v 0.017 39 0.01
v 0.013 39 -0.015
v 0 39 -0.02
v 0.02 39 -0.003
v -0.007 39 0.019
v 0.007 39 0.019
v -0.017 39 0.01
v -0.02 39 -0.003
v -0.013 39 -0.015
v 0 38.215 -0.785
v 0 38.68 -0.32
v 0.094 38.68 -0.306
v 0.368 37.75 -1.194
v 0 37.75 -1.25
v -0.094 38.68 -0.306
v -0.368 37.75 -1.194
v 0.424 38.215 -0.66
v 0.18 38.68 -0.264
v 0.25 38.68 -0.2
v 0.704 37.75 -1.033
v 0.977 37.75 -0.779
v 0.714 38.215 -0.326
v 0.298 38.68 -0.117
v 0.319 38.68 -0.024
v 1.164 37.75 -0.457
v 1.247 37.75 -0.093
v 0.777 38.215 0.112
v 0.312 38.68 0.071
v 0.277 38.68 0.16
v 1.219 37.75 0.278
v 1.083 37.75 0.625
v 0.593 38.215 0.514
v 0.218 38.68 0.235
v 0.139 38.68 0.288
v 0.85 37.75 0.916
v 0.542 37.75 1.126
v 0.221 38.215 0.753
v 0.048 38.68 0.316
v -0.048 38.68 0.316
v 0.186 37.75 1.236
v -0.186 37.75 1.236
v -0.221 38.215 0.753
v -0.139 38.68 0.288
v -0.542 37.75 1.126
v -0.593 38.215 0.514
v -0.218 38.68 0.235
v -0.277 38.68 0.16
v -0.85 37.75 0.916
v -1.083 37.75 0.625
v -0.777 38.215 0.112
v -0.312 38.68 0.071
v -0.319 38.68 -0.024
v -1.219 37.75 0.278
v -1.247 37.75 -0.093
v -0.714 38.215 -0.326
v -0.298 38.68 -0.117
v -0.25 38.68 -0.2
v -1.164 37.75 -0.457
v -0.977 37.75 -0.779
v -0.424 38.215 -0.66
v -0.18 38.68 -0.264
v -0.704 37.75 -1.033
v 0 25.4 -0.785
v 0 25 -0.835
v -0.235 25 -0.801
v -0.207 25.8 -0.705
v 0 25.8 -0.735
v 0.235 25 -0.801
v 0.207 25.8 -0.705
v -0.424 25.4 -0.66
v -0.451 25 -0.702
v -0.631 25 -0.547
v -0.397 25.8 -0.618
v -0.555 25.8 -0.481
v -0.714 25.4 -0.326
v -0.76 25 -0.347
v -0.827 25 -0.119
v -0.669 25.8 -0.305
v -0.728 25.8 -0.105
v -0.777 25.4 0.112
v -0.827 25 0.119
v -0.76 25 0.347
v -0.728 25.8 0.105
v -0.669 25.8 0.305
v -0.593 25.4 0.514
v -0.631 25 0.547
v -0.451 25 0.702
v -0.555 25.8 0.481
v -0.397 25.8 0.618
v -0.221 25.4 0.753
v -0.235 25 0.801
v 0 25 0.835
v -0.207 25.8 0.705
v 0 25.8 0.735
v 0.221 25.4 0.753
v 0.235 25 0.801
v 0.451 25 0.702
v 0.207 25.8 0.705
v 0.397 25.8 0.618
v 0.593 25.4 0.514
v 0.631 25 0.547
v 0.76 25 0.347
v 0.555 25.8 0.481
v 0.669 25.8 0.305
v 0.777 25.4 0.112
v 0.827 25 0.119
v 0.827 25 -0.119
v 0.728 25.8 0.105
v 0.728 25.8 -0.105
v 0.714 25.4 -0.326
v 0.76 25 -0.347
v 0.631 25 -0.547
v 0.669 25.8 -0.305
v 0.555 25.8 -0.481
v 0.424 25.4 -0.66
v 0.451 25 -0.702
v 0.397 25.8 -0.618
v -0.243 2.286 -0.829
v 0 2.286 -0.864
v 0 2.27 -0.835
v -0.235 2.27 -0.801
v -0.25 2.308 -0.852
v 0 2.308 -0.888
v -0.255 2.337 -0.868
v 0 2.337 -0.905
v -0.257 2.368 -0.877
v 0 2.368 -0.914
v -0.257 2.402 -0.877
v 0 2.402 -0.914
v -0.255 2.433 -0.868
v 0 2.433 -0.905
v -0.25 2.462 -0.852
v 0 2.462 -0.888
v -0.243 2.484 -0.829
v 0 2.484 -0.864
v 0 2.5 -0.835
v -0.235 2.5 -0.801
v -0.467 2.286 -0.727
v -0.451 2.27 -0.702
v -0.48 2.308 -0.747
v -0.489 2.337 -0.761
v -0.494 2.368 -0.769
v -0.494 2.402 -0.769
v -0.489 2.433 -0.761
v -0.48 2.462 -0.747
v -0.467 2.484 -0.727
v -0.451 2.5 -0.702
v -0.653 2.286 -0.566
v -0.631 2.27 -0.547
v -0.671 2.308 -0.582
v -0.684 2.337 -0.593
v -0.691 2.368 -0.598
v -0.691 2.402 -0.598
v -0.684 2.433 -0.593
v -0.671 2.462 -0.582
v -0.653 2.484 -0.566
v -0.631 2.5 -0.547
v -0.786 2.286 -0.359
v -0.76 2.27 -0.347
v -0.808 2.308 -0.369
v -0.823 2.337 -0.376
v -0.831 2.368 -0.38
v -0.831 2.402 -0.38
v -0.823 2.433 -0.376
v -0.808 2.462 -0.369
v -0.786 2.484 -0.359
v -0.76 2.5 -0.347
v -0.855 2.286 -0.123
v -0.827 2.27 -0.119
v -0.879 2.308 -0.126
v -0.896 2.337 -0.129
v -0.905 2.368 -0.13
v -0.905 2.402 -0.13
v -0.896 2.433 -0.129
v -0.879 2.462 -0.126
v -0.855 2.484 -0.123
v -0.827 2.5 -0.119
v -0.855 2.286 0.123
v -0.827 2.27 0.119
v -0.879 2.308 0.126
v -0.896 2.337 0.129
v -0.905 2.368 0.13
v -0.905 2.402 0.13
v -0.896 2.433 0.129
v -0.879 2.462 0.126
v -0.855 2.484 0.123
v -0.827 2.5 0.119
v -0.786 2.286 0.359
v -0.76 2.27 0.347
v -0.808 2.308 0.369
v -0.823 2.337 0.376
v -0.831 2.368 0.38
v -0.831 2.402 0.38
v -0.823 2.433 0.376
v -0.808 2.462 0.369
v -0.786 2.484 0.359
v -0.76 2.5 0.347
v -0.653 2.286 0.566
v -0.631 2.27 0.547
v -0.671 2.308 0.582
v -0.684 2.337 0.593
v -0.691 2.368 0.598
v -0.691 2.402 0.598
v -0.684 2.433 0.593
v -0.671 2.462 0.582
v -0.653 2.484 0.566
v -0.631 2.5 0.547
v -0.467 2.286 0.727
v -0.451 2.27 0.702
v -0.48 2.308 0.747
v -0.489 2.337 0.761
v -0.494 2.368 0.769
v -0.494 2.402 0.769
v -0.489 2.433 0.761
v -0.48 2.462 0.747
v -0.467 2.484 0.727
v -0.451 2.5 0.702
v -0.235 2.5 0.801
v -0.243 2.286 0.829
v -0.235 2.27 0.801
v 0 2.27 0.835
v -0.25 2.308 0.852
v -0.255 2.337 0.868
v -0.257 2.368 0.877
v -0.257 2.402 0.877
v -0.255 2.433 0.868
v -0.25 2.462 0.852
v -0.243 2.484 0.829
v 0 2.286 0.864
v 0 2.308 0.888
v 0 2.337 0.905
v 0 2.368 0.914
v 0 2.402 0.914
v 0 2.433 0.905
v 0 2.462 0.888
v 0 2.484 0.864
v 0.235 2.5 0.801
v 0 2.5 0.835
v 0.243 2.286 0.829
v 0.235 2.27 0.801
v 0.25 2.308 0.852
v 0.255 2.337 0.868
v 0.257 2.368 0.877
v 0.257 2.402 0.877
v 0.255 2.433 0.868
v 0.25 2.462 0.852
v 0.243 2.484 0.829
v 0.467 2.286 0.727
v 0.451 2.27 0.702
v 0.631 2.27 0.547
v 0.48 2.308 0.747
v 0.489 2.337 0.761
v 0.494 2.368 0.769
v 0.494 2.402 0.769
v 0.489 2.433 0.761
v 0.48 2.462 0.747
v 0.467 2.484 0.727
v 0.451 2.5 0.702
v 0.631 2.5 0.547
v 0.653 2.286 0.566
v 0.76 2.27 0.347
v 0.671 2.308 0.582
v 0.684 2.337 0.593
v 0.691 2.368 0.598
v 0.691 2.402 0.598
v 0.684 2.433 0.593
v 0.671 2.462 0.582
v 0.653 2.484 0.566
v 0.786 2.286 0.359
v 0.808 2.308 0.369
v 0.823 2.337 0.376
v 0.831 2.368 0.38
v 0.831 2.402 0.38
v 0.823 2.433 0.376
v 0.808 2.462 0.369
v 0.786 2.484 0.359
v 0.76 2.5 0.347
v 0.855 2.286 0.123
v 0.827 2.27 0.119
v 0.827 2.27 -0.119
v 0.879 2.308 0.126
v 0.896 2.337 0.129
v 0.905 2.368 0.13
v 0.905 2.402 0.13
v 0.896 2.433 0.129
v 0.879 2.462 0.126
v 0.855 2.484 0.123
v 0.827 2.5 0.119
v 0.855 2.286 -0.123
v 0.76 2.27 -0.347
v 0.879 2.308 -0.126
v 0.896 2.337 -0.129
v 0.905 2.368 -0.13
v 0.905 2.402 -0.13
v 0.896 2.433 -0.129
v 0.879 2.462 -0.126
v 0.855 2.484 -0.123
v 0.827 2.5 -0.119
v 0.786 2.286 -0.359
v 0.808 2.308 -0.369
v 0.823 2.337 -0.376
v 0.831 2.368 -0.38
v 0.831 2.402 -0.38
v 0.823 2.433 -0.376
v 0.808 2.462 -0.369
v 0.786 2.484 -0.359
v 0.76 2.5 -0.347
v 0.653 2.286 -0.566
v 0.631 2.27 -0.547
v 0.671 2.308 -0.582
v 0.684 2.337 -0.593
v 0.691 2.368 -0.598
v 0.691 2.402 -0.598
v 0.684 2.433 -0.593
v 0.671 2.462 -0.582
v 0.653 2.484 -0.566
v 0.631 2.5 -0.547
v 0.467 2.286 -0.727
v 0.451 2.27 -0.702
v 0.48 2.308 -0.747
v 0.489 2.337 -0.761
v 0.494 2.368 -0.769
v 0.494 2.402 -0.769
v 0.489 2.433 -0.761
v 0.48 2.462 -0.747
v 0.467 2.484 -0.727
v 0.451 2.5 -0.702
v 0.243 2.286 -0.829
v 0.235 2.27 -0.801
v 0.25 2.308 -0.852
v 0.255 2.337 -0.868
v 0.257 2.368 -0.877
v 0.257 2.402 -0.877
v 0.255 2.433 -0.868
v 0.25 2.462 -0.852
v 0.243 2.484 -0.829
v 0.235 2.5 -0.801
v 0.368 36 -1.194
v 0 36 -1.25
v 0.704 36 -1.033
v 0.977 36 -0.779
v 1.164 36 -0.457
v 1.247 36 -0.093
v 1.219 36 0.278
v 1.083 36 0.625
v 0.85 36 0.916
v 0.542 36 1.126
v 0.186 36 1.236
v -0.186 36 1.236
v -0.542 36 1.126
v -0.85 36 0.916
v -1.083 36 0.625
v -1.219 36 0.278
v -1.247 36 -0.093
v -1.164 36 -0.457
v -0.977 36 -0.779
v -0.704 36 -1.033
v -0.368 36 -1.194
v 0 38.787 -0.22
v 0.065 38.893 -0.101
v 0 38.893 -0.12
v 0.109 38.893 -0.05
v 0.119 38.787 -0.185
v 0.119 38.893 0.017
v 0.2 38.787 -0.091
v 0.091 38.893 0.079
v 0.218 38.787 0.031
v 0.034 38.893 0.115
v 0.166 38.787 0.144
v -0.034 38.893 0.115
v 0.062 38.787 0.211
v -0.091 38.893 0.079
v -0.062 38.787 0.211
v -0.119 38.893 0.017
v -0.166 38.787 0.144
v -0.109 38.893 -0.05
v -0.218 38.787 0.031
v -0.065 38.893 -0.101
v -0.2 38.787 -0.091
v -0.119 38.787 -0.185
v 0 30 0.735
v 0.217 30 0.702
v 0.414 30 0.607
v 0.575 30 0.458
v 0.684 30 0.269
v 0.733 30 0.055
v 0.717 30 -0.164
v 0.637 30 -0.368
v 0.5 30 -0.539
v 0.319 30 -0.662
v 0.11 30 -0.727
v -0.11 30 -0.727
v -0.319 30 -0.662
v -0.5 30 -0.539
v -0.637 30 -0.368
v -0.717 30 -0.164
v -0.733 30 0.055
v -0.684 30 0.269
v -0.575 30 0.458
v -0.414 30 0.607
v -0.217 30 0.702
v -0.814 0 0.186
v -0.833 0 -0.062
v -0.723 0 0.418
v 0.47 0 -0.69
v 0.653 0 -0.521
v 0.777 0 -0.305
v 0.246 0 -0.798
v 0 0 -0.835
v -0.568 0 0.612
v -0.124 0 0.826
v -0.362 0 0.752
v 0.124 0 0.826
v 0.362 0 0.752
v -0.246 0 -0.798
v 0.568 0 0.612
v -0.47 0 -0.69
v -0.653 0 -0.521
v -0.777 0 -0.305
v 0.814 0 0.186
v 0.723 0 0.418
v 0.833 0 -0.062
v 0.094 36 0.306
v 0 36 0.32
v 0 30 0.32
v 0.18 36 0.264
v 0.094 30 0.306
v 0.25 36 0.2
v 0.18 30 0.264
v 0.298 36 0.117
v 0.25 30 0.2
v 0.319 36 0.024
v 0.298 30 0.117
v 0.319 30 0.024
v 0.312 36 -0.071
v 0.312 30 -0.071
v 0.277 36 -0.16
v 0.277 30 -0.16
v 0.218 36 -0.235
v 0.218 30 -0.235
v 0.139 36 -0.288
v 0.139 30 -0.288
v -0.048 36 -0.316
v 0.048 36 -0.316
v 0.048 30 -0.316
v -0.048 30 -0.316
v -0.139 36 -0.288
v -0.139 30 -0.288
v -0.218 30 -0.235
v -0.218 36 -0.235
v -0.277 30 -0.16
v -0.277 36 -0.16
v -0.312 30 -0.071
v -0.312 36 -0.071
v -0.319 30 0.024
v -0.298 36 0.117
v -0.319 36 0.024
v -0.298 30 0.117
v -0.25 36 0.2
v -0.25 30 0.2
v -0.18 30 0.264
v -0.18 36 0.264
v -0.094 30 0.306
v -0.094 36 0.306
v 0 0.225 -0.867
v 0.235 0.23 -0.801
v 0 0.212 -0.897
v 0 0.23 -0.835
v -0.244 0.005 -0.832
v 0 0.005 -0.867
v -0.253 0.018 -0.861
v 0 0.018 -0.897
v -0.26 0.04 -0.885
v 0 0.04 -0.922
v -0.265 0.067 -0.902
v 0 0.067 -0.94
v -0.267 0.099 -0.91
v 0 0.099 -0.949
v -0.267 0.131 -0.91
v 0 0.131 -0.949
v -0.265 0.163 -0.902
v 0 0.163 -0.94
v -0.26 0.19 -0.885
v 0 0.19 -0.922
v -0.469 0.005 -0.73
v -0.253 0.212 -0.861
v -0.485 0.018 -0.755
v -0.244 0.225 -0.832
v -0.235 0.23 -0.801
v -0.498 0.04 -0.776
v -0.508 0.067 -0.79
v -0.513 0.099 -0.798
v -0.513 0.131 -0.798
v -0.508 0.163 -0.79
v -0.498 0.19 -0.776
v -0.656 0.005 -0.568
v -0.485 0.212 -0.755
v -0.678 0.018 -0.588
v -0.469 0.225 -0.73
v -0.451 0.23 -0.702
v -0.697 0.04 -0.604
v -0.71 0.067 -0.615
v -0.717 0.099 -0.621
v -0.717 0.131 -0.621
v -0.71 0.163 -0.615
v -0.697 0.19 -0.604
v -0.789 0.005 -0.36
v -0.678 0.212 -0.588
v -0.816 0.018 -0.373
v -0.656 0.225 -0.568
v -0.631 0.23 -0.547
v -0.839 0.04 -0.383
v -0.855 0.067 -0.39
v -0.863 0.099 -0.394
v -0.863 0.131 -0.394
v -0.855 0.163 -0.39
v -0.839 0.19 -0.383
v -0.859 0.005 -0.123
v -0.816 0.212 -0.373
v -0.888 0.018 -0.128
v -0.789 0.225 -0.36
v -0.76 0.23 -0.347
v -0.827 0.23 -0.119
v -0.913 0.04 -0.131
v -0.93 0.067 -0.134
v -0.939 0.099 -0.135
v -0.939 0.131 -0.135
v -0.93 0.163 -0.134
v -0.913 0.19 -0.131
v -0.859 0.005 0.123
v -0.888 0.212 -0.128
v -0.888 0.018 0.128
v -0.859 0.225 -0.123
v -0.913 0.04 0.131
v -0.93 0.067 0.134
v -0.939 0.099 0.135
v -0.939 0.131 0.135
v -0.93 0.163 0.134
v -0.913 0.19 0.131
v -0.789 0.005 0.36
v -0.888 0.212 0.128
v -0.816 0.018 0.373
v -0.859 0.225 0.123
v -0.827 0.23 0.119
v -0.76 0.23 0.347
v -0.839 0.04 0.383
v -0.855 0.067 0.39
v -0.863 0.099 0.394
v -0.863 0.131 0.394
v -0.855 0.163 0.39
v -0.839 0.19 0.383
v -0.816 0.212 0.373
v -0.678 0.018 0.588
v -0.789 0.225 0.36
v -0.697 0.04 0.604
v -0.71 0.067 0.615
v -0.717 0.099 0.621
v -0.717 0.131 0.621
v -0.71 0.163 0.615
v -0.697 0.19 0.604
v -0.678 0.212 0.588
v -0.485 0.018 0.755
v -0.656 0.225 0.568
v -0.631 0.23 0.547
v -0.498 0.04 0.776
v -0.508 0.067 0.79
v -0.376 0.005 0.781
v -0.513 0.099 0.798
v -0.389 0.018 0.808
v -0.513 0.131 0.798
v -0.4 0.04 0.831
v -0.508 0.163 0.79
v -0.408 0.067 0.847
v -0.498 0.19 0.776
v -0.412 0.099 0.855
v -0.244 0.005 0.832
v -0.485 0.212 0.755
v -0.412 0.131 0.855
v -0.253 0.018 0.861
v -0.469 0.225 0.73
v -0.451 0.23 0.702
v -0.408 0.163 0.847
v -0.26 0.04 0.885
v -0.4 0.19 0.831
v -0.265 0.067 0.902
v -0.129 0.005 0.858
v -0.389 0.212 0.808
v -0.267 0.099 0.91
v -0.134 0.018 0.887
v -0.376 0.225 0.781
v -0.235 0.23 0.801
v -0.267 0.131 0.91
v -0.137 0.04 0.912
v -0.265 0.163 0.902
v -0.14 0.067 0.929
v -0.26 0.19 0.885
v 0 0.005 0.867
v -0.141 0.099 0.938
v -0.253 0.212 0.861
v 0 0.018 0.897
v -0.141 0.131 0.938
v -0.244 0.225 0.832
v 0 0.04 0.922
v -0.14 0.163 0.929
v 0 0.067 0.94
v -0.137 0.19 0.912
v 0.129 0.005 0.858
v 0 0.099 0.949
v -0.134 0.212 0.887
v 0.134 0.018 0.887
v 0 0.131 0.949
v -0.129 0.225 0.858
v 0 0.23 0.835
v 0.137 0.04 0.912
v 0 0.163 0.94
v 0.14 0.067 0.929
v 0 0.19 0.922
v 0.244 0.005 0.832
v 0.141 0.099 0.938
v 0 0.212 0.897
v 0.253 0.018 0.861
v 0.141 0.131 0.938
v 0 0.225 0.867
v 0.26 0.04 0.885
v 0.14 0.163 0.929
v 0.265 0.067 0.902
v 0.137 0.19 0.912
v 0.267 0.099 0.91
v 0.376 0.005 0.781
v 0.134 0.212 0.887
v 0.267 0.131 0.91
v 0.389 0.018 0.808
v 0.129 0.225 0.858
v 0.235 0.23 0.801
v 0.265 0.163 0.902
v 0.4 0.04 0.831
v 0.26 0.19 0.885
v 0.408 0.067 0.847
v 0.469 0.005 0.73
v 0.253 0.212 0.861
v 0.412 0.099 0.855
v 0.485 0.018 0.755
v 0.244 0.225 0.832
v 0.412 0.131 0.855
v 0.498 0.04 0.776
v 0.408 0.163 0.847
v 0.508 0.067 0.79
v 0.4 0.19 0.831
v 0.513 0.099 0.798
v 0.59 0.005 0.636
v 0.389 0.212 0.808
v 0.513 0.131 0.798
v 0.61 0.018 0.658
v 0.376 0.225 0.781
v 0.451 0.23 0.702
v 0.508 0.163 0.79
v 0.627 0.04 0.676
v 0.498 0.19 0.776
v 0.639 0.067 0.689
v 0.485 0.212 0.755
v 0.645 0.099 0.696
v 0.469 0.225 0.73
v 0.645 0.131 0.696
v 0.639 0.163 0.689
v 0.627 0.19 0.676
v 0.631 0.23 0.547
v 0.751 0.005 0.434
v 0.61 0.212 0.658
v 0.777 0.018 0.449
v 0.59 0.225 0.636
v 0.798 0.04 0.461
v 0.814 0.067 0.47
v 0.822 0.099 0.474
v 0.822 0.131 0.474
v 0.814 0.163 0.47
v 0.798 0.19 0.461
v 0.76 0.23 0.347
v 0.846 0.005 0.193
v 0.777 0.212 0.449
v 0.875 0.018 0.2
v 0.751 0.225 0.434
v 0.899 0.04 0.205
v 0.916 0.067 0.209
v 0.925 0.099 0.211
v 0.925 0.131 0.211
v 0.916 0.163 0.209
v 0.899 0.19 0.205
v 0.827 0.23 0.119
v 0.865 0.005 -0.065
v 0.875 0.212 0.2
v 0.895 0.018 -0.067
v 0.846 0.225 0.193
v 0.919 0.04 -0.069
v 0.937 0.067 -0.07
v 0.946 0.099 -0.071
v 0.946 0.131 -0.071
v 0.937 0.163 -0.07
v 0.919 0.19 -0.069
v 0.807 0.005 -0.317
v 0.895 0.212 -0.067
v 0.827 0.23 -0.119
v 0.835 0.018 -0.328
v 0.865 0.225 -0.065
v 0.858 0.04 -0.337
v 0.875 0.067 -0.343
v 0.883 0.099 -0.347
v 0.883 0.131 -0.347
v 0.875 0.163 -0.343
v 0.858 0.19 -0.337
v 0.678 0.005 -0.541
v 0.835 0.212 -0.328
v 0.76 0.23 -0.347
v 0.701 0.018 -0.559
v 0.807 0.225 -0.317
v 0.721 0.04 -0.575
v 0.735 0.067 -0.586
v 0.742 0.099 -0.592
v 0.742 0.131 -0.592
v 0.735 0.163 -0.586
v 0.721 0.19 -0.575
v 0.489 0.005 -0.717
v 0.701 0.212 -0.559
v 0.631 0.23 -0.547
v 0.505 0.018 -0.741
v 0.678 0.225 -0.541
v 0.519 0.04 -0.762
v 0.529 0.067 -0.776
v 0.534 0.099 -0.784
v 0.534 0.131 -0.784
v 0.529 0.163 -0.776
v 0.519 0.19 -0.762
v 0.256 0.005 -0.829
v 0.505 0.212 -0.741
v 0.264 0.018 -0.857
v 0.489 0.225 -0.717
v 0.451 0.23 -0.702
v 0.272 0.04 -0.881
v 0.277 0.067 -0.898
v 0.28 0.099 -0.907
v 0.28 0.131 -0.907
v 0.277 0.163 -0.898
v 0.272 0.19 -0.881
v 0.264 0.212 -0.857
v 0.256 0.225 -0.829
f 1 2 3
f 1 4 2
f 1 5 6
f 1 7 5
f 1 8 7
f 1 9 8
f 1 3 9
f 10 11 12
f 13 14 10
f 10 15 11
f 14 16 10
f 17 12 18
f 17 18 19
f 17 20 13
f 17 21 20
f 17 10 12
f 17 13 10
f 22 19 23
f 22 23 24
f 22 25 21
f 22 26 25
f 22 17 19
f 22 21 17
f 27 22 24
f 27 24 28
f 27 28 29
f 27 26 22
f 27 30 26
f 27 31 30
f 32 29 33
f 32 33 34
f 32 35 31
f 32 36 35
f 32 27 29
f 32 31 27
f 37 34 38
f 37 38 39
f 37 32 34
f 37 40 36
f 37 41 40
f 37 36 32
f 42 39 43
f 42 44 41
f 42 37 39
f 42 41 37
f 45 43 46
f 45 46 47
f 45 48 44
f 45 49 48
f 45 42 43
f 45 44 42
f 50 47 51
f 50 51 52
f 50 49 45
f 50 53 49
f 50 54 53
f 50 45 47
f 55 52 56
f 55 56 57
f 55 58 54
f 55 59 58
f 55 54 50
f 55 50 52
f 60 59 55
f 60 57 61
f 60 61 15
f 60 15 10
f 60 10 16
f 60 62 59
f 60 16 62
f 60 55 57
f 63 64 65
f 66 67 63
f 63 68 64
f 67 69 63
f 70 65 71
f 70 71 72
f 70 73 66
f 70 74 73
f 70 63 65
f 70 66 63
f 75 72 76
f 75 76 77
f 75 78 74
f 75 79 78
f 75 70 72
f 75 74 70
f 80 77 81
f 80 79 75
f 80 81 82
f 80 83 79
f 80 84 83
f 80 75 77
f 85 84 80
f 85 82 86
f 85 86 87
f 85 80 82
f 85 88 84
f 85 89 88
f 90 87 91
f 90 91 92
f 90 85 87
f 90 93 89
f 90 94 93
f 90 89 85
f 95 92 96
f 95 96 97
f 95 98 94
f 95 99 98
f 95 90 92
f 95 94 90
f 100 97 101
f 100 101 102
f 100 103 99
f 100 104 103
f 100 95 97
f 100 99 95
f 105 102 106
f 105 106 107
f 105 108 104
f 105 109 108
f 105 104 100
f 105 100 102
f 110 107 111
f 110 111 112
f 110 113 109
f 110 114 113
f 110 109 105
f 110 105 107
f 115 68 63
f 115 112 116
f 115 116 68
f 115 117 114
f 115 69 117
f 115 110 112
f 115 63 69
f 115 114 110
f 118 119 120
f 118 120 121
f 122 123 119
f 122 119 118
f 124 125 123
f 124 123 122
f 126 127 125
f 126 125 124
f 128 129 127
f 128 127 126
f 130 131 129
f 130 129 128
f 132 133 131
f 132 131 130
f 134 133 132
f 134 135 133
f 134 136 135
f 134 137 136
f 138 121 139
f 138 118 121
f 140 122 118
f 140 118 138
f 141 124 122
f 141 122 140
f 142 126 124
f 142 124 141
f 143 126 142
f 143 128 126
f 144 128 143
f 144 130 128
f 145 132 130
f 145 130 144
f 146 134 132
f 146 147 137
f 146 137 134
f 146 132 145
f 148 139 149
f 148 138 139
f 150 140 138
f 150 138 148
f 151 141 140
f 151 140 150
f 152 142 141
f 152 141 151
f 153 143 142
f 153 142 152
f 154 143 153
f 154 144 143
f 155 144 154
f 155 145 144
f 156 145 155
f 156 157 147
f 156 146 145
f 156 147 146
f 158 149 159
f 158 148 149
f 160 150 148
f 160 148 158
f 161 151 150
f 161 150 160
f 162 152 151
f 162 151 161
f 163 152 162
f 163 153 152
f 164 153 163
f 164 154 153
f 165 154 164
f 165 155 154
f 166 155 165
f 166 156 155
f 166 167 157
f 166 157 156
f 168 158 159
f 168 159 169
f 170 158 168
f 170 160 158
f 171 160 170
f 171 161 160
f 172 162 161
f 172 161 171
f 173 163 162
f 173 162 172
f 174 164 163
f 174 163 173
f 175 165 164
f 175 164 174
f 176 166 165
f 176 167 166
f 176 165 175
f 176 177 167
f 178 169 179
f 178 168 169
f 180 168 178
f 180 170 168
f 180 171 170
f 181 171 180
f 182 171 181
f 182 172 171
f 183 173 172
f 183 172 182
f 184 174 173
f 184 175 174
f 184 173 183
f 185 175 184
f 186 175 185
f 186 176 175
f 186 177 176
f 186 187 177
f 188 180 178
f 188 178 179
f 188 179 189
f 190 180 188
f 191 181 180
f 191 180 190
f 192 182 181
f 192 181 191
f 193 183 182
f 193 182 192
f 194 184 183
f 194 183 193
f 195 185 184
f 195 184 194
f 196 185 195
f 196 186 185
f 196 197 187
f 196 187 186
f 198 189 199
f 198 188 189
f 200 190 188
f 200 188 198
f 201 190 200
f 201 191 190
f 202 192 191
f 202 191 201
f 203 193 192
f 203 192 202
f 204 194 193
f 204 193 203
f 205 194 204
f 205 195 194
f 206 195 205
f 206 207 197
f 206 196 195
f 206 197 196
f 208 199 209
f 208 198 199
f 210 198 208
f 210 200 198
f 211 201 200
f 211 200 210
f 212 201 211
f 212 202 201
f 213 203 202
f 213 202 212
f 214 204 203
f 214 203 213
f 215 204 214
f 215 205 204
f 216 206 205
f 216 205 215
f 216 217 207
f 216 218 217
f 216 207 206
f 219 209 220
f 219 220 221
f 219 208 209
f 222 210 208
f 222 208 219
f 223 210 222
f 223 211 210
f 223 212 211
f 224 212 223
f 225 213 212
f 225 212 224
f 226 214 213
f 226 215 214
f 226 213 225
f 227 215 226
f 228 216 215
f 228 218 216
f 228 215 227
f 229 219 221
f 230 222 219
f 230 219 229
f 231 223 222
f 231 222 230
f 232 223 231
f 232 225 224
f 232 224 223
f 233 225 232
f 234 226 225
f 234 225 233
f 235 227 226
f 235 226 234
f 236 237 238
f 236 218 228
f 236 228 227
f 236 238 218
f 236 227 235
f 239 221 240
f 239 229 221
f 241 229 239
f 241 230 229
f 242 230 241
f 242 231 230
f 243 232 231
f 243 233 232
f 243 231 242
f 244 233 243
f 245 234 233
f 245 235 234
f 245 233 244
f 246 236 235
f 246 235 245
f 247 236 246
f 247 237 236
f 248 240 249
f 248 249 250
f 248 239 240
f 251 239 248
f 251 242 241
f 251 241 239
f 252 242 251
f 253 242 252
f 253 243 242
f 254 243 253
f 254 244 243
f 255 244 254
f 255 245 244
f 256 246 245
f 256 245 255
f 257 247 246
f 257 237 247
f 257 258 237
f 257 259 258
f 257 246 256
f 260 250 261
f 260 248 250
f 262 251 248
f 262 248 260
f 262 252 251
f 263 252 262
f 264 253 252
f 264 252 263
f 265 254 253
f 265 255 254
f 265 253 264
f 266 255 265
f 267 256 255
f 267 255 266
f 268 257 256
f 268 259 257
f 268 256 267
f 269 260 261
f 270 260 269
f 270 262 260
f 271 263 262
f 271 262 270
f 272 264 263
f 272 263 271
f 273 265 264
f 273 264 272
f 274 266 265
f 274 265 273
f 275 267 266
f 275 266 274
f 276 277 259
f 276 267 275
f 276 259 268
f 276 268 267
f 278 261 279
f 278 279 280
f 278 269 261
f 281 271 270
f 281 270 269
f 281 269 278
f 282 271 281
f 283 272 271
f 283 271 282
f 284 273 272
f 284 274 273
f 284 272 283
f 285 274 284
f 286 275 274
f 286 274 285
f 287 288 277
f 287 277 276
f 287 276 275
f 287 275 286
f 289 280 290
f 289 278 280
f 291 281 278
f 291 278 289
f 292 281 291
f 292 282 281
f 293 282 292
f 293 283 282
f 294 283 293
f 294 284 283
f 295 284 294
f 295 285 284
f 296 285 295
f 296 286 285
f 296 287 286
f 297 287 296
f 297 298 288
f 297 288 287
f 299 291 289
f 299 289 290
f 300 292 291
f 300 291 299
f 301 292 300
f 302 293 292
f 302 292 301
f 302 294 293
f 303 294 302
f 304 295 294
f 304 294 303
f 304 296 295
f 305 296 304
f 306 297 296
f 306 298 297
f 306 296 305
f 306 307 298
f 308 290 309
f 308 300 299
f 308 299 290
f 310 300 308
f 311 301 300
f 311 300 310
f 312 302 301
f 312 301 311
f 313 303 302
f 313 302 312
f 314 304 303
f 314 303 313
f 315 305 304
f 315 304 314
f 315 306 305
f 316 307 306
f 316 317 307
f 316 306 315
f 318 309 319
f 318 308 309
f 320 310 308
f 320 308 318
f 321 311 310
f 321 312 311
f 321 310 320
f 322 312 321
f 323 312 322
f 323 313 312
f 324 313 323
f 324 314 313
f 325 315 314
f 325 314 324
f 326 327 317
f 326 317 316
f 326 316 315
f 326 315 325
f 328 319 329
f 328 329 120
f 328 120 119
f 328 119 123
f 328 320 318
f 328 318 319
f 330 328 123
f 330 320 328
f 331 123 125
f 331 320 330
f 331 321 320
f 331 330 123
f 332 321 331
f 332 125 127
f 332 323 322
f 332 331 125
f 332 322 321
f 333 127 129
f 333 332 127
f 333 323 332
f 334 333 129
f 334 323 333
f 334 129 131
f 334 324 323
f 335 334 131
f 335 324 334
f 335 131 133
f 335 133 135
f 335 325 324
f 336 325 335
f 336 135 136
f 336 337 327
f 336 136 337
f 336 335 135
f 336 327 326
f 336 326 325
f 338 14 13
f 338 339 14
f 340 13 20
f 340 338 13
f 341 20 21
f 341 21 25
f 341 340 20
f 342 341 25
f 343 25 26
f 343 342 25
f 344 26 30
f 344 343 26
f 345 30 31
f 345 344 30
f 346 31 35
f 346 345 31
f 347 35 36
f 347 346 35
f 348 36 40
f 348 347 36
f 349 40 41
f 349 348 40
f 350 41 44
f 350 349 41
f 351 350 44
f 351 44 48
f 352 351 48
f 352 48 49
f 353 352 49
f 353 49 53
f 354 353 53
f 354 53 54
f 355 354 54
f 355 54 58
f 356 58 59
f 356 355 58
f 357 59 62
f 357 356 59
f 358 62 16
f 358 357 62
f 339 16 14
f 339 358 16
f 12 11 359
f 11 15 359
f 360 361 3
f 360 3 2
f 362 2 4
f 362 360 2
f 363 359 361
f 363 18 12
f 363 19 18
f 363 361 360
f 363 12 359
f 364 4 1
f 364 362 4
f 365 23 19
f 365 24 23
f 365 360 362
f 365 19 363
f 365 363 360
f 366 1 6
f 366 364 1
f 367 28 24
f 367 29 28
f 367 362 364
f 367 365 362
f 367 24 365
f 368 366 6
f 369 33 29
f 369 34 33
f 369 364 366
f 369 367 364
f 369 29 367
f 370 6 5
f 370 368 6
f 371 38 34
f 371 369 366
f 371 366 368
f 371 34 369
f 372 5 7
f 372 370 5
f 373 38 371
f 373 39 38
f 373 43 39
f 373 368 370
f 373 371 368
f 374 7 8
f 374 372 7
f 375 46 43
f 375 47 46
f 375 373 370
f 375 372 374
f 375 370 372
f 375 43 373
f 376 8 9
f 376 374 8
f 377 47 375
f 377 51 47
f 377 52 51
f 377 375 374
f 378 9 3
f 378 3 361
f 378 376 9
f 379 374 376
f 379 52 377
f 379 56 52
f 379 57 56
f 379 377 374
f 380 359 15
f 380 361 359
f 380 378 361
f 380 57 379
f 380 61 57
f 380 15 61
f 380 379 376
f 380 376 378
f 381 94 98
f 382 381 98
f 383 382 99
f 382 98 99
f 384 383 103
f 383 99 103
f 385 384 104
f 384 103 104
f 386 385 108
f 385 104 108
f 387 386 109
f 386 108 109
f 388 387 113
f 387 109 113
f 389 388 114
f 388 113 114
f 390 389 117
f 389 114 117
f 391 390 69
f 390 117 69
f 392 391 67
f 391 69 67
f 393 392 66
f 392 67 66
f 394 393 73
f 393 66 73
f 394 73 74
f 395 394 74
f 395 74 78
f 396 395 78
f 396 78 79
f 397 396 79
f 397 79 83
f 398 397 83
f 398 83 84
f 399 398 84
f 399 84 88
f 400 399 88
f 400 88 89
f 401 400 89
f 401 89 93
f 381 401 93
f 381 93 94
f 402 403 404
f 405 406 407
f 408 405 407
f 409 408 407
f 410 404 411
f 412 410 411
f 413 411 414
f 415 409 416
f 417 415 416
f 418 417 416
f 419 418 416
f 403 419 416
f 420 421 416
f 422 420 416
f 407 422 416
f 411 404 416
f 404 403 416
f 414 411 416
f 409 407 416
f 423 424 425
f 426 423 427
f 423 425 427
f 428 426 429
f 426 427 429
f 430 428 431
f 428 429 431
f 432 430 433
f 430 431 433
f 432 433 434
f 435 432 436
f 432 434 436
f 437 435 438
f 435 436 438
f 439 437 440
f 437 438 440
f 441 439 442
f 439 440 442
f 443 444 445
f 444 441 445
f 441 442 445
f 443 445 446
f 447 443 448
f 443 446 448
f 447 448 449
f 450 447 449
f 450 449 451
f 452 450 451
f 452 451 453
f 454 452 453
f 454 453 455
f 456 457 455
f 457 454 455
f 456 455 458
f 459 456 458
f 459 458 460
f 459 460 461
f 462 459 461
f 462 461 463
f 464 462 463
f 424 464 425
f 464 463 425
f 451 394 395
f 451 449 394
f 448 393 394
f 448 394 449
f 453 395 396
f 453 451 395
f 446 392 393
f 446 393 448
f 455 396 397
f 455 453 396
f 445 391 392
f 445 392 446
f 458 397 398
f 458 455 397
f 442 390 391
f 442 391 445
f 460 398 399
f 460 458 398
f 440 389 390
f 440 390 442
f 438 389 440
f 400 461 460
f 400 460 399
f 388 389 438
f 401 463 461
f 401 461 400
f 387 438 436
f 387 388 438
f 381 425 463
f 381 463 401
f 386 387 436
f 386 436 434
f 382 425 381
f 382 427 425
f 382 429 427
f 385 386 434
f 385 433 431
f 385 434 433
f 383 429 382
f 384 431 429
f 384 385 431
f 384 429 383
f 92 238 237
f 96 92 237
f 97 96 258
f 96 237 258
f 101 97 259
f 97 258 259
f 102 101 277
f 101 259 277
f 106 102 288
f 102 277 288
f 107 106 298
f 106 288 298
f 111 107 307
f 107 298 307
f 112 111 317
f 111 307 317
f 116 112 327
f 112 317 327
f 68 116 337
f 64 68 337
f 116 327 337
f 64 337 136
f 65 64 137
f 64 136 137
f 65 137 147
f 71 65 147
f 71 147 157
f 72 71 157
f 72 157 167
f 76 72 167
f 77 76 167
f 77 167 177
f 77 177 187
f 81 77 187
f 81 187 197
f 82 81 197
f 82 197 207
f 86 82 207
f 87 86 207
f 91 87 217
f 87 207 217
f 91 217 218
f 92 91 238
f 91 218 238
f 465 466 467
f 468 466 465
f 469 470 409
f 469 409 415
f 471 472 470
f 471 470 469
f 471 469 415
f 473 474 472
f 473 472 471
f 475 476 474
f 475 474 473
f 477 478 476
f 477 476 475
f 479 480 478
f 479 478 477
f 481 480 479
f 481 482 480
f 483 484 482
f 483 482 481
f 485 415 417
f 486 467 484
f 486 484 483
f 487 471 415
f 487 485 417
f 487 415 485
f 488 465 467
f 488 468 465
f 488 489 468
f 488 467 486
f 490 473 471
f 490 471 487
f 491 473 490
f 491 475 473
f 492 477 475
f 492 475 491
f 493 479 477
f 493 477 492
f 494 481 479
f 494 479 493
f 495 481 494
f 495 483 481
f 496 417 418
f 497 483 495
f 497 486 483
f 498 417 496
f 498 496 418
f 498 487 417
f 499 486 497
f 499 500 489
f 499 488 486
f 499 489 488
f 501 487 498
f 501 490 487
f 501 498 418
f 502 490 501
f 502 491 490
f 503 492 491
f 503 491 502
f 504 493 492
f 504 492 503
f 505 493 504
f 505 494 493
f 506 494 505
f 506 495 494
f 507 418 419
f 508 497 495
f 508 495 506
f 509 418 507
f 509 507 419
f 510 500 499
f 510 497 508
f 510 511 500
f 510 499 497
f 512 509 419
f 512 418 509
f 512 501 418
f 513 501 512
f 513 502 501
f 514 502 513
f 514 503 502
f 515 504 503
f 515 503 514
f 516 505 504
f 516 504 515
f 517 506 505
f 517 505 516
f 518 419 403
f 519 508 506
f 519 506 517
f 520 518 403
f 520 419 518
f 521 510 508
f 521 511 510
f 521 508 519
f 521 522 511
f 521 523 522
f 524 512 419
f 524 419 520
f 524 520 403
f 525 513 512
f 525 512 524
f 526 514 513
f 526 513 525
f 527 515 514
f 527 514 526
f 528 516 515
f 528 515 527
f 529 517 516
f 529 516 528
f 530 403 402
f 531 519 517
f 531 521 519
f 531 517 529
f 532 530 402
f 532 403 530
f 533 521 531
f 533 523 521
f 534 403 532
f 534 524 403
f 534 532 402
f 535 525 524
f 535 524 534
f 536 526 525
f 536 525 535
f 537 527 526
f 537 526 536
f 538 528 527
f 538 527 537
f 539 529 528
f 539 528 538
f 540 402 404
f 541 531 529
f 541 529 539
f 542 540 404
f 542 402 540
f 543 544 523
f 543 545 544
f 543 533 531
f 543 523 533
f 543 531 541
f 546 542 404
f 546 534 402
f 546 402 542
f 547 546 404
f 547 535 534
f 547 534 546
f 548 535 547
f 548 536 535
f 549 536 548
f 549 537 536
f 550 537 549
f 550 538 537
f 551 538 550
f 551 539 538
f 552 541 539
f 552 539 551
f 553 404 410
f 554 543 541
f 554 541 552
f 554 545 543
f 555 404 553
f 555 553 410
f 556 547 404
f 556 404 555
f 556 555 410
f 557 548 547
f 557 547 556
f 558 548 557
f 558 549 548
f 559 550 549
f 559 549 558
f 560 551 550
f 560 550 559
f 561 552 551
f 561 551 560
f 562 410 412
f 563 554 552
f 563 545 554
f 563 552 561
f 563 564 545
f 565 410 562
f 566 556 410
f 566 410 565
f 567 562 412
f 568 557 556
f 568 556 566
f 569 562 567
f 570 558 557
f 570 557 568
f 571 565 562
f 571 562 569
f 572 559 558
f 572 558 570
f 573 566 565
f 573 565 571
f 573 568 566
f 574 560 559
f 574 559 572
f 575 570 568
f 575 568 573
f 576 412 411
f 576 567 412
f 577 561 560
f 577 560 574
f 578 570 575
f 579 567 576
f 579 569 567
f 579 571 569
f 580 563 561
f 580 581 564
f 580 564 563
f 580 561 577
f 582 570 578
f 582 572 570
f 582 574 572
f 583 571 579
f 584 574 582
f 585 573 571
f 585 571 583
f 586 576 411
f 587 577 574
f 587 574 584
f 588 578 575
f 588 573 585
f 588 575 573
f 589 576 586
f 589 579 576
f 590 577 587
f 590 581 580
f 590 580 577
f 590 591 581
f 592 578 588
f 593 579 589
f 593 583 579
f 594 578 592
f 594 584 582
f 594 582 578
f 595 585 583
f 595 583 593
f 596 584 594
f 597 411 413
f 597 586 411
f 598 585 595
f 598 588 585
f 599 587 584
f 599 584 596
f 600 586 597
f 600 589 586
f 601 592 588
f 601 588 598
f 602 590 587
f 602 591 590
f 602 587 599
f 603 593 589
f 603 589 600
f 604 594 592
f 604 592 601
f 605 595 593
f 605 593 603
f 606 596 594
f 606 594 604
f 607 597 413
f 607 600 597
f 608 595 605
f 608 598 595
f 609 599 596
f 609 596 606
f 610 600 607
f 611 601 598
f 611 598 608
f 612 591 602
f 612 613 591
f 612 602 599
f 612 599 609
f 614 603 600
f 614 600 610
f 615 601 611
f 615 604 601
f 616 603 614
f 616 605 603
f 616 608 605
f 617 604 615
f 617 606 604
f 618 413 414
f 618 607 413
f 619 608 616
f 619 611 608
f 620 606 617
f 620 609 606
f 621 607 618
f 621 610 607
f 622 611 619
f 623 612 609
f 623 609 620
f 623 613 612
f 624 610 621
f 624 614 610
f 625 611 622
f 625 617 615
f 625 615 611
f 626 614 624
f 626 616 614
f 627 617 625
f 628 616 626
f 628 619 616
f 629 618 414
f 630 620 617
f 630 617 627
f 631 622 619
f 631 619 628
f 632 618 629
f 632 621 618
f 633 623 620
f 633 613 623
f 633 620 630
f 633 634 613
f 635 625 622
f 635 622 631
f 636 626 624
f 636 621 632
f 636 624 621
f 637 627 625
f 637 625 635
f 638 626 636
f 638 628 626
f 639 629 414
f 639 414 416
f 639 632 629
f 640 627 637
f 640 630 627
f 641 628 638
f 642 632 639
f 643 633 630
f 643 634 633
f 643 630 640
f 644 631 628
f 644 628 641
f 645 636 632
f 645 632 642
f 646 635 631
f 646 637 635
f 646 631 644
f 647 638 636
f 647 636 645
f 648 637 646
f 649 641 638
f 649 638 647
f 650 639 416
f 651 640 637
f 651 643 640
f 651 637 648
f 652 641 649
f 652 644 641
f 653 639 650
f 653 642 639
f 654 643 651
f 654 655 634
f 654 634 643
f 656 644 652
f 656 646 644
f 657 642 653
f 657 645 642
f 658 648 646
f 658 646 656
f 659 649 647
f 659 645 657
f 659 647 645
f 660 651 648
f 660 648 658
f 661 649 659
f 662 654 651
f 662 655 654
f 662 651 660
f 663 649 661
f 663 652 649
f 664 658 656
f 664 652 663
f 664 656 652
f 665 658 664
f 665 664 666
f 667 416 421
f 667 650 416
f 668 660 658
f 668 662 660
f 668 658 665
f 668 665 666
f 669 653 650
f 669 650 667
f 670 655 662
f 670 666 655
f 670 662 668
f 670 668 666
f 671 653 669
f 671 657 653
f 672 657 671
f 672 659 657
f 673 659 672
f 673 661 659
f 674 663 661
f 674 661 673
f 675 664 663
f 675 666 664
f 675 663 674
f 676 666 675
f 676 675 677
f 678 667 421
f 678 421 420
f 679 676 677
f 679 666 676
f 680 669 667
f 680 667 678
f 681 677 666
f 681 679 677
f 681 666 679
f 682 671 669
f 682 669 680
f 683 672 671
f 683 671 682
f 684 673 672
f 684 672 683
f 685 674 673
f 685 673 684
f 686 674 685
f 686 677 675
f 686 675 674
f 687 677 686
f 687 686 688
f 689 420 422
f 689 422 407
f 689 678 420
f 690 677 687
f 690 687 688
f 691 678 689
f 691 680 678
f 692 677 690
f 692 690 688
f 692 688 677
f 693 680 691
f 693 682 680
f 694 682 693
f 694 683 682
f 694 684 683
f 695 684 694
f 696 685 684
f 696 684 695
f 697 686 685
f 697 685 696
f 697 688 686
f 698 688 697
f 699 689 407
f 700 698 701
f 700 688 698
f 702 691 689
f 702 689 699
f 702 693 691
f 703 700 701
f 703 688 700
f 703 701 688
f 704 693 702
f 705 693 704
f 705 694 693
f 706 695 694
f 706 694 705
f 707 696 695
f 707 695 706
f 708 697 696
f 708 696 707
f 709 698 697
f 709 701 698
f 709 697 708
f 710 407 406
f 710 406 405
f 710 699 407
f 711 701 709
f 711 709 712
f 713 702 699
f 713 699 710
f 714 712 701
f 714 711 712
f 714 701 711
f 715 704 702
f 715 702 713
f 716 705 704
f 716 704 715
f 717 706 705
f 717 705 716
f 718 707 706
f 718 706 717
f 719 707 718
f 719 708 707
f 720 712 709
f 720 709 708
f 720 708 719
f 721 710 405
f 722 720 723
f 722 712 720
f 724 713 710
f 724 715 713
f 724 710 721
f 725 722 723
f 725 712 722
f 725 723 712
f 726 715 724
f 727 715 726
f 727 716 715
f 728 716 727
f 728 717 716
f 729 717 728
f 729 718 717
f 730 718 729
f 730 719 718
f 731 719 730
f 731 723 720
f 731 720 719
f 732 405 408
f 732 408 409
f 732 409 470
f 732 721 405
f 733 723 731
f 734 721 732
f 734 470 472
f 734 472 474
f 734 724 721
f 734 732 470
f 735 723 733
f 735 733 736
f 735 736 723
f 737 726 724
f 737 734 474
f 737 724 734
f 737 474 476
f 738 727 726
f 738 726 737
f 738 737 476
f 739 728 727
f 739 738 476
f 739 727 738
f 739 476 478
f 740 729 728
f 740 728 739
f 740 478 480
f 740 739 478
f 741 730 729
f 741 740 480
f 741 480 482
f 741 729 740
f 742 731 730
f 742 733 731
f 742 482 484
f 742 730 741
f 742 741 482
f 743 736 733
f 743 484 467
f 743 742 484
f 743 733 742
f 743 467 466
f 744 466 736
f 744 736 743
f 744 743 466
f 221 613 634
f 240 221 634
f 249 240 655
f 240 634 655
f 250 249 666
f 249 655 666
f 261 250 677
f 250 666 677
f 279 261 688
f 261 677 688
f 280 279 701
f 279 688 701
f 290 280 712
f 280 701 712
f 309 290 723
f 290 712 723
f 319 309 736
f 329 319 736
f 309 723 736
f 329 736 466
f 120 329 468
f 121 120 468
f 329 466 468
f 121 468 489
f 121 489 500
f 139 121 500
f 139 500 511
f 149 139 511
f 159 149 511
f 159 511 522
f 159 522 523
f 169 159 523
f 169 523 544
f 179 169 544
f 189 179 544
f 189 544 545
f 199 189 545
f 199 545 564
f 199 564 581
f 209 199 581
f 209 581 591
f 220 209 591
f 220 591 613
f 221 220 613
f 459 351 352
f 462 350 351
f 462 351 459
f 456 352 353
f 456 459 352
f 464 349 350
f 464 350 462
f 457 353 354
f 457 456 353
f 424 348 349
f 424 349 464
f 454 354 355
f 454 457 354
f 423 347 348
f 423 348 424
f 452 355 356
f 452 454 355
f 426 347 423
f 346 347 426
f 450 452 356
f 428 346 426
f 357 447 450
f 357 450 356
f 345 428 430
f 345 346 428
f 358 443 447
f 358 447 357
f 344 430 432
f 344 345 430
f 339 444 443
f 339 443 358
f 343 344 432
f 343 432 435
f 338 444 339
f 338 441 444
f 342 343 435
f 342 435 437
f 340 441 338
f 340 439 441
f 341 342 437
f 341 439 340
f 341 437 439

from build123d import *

# Parameters (mm, degrees)
SKETCH_1_R      = 0.835
EXTRUDE_1_DEPTH = 25
SKETCH_2_R      = 0.735
EXTRUDE_2_DEPTH = 5
SKETCH_3_R      = 0.32
EXTRUDE_3_DEPTH = 9


with BuildPart() as part:
    # 草图1 → 凸台-拉伸1 (new body)
    with BuildSketch(Plane(origin=(0, 0, 0), x_dir=(1, 0, 0), z_dir=(0, 1, 0))):
        with Locations(Location((0, 0, 0), (0, 0, 270))):
            Circle(SKETCH_1_R)
    extrude(amount=EXTRUDE_1_DEPTH)

    # 草图2 → 凸台-拉伸2 (add)
    with BuildSketch(Plane(origin=(0, 25, 0), x_dir=(1, 0, 0), z_dir=(0, 1, 0))):
        with Locations(Location((0, 0, 0), (0, 0, 270))):
            Circle(SKETCH_2_R)
    extrude(amount=EXTRUDE_2_DEPTH)

    # 草图3 → 凸台-拉伸3 (add)
    with BuildSketch(Plane(origin=(0, 30, 0), x_dir=(1, 0, 0), z_dir=(0, 1, 0))):
        with Locations(Location((0, 0, 0), (0, 0, 270))):
            Circle(SKETCH_3_R)
    extrude(amount=EXTRUDE_3_DEPTH)

    # 草图5 → 旋转1 (revolve)
    with BuildSketch(Plane.XY, mode=Mode.PRIVATE) as revolve_1_sk:
        Polygon((0.835, 25), (0.735, 25.8), (0.735, 25), align=None)
        with BuildLine():
            Line((0.835, 0.23), (0.835, 0))
            ThreePointArc((0.835, 0), (0.95, 0.115), (0.835, 0.23))
        make_face()
        with BuildLine():
            Line((0.835, 2.5), (0.835, 2.27))
            ThreePointArc((0.835, 2.27), (0.915, 2.385), (0.835, 2.5))
        make_face()
    revolve(revolve_1_sk.sketch.rotate(Axis((0, 0, 0), (0, 1, 0)), 90), axis=Axis((0, 0, 0), (0, 1, 0)))

    # 草图6 → 旋转2 (revolve)
    with BuildSketch(Plane.XY, mode=Mode.PRIVATE) as revolve_2_sk:
        Polygon((0, 39), (-1.25, 37.75), (-1.25, 36), (0, 36), align=None)
    revolve(revolve_2_sk.sketch.rotate(Axis((0, 0, 0), (0, -1, 0)), 90), axis=Axis((0, 0, 0), (0, -1, 0)))

    # 草图7 → 切除-旋转5 (revolve, cut)
    with BuildSketch(Plane.XY, mode=Mode.PRIVATE) as cut_revolve_5_sk:
        Polygon((0.32, 39), (0.02, 39), (0.32, 38.68), align=None)
    revolve(cut_revolve_5_sk.sketch.rotate(Axis((0, 0, 0), (0, -1, 0)), 270), axis=Axis((0, 0, 0), (0, -1, 0)), mode=Mode.SUBTRACT)


solid = part.part
